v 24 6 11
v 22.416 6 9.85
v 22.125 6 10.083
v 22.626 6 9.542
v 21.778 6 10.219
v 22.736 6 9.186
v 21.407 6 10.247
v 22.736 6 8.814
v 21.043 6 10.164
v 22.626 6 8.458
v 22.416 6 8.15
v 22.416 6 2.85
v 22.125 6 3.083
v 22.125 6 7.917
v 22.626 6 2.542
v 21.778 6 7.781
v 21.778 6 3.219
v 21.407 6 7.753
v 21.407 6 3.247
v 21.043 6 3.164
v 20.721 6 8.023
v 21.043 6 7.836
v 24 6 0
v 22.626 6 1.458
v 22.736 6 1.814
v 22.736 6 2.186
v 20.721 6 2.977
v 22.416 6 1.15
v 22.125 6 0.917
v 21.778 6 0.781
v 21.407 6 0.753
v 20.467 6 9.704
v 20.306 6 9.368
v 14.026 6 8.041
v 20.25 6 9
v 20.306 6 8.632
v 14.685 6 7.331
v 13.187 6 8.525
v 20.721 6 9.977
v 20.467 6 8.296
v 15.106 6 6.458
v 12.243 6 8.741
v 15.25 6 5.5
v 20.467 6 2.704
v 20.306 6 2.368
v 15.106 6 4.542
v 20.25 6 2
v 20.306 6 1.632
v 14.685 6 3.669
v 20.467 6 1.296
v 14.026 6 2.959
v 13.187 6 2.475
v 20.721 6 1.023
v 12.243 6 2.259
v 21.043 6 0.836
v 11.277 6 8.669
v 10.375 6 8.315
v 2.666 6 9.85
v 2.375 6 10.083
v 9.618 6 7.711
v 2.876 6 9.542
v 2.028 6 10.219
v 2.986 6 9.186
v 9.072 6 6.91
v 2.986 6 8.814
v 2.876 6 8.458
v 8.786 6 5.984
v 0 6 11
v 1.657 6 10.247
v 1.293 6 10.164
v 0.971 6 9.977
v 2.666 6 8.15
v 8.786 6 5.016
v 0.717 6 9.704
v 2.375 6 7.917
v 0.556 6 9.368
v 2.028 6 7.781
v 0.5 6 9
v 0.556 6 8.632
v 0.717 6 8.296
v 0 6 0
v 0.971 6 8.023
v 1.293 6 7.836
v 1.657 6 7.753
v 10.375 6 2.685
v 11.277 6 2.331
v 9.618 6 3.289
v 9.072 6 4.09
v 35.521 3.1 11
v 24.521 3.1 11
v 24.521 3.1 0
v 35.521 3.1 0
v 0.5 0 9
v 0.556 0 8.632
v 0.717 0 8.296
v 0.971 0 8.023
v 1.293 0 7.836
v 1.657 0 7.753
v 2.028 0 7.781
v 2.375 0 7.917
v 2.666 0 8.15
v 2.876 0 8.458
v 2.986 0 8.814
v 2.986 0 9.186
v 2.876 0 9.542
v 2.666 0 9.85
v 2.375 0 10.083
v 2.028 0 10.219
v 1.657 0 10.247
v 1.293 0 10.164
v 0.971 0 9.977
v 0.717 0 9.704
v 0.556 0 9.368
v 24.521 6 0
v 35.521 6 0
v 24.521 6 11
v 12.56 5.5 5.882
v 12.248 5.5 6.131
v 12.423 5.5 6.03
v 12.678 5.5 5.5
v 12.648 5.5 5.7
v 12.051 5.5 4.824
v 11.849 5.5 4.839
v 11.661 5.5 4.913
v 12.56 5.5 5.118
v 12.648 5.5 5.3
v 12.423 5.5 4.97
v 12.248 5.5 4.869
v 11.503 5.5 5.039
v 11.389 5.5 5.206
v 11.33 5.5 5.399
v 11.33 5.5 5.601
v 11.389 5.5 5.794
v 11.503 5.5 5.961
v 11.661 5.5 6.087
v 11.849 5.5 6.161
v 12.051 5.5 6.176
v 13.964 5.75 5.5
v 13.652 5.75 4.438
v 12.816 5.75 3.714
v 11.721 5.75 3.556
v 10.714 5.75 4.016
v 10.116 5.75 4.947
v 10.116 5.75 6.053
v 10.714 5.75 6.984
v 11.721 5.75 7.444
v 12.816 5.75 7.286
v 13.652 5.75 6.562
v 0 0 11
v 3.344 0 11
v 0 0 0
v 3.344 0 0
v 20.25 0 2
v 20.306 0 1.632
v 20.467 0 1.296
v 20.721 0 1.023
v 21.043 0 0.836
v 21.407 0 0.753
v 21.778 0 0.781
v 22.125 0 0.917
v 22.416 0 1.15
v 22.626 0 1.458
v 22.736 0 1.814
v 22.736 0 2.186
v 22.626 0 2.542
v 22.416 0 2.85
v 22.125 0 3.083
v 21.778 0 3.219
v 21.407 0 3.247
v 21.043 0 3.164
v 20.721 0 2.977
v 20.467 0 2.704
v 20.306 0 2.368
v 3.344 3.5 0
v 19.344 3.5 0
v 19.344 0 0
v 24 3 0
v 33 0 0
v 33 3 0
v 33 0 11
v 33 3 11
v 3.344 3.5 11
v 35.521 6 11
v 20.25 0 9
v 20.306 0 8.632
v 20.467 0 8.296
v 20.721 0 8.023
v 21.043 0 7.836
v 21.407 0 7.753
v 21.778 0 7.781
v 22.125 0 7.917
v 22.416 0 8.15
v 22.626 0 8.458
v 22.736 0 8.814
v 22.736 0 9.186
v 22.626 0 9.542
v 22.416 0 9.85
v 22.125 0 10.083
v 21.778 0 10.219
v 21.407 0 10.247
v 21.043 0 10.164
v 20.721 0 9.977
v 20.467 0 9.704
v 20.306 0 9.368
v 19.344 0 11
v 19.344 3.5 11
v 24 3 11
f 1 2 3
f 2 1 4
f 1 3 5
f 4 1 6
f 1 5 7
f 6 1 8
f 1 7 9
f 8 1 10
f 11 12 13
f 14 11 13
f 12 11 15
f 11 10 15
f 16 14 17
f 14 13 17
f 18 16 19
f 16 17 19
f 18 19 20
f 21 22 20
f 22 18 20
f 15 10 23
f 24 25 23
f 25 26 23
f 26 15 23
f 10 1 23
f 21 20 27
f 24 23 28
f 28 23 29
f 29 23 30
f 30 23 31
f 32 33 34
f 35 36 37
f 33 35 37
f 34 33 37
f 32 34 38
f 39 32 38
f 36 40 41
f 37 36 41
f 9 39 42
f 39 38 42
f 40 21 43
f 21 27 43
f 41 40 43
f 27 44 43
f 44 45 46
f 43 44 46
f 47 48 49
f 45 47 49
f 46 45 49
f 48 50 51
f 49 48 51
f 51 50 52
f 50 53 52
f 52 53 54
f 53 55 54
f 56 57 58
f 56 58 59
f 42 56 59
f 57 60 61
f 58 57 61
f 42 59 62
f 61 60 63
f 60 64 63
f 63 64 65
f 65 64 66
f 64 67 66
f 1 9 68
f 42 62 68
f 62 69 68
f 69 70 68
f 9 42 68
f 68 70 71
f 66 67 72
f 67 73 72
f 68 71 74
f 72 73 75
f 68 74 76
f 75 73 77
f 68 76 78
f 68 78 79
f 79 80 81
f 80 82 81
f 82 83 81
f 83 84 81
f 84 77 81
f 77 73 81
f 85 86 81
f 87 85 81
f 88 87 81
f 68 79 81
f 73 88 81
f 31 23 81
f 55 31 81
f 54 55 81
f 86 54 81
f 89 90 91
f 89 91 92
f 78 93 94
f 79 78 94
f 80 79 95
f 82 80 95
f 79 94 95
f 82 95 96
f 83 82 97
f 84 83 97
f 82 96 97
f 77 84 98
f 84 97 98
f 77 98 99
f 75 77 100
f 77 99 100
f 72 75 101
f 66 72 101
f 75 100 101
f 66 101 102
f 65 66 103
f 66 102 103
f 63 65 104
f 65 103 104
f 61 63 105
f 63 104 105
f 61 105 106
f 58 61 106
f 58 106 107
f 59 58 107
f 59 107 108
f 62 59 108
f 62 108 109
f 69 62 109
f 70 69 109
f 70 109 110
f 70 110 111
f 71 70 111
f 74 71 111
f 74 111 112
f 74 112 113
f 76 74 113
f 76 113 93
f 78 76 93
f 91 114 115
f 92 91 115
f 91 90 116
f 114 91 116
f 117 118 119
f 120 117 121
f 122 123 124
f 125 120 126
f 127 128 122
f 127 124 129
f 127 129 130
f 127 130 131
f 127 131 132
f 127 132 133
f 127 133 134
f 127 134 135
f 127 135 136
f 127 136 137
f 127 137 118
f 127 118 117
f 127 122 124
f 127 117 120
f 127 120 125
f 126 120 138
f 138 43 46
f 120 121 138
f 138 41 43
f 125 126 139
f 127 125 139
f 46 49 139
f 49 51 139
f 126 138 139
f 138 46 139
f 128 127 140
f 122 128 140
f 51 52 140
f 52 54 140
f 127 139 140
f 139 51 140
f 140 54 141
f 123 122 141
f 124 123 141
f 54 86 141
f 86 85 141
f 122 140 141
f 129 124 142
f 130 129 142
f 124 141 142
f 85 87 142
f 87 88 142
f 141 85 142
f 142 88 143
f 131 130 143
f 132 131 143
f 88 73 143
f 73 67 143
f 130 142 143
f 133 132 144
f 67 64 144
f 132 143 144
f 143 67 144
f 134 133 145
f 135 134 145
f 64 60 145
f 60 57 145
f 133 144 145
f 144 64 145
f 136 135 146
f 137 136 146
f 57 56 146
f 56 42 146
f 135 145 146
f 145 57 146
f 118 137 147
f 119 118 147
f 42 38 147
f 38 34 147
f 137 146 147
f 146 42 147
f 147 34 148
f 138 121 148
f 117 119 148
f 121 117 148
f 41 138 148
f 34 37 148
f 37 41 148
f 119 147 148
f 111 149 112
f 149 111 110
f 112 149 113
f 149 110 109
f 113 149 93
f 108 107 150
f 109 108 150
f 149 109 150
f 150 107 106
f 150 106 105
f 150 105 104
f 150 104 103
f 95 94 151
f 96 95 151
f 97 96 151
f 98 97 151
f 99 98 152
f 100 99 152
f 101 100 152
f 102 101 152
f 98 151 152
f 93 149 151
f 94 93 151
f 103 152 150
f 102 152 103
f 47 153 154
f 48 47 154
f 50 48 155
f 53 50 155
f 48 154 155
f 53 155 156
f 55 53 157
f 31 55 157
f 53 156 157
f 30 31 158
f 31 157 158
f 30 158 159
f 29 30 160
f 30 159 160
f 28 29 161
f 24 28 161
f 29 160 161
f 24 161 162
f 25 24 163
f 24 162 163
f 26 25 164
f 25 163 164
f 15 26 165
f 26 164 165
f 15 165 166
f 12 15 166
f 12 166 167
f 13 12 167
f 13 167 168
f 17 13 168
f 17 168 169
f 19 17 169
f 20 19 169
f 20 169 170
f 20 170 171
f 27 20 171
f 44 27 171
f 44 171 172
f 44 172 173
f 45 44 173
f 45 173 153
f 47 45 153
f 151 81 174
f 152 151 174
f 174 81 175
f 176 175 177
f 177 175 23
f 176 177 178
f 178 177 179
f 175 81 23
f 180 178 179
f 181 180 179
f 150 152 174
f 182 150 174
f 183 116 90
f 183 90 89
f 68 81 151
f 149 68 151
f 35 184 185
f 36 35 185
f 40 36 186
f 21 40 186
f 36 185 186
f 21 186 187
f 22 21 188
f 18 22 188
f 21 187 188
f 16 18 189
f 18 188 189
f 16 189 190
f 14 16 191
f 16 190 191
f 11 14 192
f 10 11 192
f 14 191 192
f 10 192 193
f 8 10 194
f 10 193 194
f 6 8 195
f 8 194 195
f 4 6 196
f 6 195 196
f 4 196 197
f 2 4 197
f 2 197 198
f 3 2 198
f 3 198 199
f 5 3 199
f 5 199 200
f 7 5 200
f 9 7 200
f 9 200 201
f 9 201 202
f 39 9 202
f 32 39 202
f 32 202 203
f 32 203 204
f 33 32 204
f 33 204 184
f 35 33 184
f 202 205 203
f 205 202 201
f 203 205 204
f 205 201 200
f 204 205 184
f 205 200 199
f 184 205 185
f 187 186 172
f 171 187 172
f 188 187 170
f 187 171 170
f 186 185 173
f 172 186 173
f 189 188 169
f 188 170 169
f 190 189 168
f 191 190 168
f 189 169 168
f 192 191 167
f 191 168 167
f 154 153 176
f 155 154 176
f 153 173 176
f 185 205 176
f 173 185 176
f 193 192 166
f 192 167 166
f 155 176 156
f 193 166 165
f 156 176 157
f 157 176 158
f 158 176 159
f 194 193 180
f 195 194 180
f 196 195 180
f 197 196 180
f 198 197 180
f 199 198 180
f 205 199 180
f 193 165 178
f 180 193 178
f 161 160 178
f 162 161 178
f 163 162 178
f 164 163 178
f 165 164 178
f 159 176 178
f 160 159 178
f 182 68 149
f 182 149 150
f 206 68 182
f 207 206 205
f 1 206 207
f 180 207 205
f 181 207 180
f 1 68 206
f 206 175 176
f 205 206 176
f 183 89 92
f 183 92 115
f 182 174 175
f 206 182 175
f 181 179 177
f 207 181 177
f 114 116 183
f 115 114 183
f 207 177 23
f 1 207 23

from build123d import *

# Parameters (mm, degrees)
BOSS_EXTRUDE1_DEPTH        = 11
F_2_5_2_5_DIAMETER_HOLE1_D = 2.5
SKETCH5_W                  = 11
SKETCH5_H                  = 2.9
BOSS_EXTRUDE2_DEPTH        = 11
SKETCH6_R                  = 3.25
CUT_EXTRUDE1_DEPTH         = 0.5
CUT_EXTRUDE1_DRAFT         = -79


with BuildPart() as part:
    # Sketch1 → Boss-Extrude1 (new body)
    with BuildSketch(Plane.XY):
        Polygon((19.343787585, 0), (24, 0), (33, 0), (33, 3), (24, 3), (24, 6), (0, 6), (0, 0), (3.343787585, 0), (3.343787585, 3.5), (19.343787585, 3.5), align=None)
    extrude(amount=BOSS_EXTRUDE1_DEPTH)

    # Ø2.5 (2.5) Diameter Hole1 (through all)
    with Locations(Plane(origin=(0, 6, 0), x_dir=(1, 0, 0), z_dir=(0, 1, 0))):
        with Locations((1.75, -9), (21.5, -2), (21.5, -9)):
            Hole(F_2_5_2_5_DIAMETER_HOLE1_D / 2)


with BuildPart() as body_2:
    # Sketch5 → Boss-Extrude2 (new body)
    with BuildSketch(Plane.XY.offset(11)):
        with Locations((30.021128577, 4.55)):
            Rectangle(SKETCH5_W, SKETCH5_H)
    extrude(amount=-BOSS_EXTRUDE2_DEPTH)


with BuildPart() as cut_extrude1_tool:
    # Sketch6 → Cut-Extrude1 (with draft: the straight prism first)
    with BuildSketch(Plane(origin=(0, 6, 0), x_dir=(1, 0, 0), z_dir=(0, 1, 0))):
        with Locations((12, -5.5)):
            Circle(SKETCH6_R)
    extrude(amount=-CUT_EXTRUDE1_DEPTH)
    # Cut-Extrude1: the draft: its side faces are tilted about the plane it starts from
    cut_extrude1_sides = [cut_extrude1_tool.faces().sort_by_distance(p)[0] for p in [
        (8.75, 5.75, 5.5),
    ]]
    draft(cut_extrude1_sides, Plane(origin=(0, 6, 0), x_dir=(1, 0, 0), z_dir=(0, 1, 0)), CUT_EXTRUDE1_DRAFT)


with BuildPart() as part_1:
    add(part.part)

    # Cut-Extrude1: cut by cut_extrude1_tool
    add(cut_extrude1_tool.part, mode=Mode.SUBTRACT)


solid = Compound([body_2.part, part_1.part])
